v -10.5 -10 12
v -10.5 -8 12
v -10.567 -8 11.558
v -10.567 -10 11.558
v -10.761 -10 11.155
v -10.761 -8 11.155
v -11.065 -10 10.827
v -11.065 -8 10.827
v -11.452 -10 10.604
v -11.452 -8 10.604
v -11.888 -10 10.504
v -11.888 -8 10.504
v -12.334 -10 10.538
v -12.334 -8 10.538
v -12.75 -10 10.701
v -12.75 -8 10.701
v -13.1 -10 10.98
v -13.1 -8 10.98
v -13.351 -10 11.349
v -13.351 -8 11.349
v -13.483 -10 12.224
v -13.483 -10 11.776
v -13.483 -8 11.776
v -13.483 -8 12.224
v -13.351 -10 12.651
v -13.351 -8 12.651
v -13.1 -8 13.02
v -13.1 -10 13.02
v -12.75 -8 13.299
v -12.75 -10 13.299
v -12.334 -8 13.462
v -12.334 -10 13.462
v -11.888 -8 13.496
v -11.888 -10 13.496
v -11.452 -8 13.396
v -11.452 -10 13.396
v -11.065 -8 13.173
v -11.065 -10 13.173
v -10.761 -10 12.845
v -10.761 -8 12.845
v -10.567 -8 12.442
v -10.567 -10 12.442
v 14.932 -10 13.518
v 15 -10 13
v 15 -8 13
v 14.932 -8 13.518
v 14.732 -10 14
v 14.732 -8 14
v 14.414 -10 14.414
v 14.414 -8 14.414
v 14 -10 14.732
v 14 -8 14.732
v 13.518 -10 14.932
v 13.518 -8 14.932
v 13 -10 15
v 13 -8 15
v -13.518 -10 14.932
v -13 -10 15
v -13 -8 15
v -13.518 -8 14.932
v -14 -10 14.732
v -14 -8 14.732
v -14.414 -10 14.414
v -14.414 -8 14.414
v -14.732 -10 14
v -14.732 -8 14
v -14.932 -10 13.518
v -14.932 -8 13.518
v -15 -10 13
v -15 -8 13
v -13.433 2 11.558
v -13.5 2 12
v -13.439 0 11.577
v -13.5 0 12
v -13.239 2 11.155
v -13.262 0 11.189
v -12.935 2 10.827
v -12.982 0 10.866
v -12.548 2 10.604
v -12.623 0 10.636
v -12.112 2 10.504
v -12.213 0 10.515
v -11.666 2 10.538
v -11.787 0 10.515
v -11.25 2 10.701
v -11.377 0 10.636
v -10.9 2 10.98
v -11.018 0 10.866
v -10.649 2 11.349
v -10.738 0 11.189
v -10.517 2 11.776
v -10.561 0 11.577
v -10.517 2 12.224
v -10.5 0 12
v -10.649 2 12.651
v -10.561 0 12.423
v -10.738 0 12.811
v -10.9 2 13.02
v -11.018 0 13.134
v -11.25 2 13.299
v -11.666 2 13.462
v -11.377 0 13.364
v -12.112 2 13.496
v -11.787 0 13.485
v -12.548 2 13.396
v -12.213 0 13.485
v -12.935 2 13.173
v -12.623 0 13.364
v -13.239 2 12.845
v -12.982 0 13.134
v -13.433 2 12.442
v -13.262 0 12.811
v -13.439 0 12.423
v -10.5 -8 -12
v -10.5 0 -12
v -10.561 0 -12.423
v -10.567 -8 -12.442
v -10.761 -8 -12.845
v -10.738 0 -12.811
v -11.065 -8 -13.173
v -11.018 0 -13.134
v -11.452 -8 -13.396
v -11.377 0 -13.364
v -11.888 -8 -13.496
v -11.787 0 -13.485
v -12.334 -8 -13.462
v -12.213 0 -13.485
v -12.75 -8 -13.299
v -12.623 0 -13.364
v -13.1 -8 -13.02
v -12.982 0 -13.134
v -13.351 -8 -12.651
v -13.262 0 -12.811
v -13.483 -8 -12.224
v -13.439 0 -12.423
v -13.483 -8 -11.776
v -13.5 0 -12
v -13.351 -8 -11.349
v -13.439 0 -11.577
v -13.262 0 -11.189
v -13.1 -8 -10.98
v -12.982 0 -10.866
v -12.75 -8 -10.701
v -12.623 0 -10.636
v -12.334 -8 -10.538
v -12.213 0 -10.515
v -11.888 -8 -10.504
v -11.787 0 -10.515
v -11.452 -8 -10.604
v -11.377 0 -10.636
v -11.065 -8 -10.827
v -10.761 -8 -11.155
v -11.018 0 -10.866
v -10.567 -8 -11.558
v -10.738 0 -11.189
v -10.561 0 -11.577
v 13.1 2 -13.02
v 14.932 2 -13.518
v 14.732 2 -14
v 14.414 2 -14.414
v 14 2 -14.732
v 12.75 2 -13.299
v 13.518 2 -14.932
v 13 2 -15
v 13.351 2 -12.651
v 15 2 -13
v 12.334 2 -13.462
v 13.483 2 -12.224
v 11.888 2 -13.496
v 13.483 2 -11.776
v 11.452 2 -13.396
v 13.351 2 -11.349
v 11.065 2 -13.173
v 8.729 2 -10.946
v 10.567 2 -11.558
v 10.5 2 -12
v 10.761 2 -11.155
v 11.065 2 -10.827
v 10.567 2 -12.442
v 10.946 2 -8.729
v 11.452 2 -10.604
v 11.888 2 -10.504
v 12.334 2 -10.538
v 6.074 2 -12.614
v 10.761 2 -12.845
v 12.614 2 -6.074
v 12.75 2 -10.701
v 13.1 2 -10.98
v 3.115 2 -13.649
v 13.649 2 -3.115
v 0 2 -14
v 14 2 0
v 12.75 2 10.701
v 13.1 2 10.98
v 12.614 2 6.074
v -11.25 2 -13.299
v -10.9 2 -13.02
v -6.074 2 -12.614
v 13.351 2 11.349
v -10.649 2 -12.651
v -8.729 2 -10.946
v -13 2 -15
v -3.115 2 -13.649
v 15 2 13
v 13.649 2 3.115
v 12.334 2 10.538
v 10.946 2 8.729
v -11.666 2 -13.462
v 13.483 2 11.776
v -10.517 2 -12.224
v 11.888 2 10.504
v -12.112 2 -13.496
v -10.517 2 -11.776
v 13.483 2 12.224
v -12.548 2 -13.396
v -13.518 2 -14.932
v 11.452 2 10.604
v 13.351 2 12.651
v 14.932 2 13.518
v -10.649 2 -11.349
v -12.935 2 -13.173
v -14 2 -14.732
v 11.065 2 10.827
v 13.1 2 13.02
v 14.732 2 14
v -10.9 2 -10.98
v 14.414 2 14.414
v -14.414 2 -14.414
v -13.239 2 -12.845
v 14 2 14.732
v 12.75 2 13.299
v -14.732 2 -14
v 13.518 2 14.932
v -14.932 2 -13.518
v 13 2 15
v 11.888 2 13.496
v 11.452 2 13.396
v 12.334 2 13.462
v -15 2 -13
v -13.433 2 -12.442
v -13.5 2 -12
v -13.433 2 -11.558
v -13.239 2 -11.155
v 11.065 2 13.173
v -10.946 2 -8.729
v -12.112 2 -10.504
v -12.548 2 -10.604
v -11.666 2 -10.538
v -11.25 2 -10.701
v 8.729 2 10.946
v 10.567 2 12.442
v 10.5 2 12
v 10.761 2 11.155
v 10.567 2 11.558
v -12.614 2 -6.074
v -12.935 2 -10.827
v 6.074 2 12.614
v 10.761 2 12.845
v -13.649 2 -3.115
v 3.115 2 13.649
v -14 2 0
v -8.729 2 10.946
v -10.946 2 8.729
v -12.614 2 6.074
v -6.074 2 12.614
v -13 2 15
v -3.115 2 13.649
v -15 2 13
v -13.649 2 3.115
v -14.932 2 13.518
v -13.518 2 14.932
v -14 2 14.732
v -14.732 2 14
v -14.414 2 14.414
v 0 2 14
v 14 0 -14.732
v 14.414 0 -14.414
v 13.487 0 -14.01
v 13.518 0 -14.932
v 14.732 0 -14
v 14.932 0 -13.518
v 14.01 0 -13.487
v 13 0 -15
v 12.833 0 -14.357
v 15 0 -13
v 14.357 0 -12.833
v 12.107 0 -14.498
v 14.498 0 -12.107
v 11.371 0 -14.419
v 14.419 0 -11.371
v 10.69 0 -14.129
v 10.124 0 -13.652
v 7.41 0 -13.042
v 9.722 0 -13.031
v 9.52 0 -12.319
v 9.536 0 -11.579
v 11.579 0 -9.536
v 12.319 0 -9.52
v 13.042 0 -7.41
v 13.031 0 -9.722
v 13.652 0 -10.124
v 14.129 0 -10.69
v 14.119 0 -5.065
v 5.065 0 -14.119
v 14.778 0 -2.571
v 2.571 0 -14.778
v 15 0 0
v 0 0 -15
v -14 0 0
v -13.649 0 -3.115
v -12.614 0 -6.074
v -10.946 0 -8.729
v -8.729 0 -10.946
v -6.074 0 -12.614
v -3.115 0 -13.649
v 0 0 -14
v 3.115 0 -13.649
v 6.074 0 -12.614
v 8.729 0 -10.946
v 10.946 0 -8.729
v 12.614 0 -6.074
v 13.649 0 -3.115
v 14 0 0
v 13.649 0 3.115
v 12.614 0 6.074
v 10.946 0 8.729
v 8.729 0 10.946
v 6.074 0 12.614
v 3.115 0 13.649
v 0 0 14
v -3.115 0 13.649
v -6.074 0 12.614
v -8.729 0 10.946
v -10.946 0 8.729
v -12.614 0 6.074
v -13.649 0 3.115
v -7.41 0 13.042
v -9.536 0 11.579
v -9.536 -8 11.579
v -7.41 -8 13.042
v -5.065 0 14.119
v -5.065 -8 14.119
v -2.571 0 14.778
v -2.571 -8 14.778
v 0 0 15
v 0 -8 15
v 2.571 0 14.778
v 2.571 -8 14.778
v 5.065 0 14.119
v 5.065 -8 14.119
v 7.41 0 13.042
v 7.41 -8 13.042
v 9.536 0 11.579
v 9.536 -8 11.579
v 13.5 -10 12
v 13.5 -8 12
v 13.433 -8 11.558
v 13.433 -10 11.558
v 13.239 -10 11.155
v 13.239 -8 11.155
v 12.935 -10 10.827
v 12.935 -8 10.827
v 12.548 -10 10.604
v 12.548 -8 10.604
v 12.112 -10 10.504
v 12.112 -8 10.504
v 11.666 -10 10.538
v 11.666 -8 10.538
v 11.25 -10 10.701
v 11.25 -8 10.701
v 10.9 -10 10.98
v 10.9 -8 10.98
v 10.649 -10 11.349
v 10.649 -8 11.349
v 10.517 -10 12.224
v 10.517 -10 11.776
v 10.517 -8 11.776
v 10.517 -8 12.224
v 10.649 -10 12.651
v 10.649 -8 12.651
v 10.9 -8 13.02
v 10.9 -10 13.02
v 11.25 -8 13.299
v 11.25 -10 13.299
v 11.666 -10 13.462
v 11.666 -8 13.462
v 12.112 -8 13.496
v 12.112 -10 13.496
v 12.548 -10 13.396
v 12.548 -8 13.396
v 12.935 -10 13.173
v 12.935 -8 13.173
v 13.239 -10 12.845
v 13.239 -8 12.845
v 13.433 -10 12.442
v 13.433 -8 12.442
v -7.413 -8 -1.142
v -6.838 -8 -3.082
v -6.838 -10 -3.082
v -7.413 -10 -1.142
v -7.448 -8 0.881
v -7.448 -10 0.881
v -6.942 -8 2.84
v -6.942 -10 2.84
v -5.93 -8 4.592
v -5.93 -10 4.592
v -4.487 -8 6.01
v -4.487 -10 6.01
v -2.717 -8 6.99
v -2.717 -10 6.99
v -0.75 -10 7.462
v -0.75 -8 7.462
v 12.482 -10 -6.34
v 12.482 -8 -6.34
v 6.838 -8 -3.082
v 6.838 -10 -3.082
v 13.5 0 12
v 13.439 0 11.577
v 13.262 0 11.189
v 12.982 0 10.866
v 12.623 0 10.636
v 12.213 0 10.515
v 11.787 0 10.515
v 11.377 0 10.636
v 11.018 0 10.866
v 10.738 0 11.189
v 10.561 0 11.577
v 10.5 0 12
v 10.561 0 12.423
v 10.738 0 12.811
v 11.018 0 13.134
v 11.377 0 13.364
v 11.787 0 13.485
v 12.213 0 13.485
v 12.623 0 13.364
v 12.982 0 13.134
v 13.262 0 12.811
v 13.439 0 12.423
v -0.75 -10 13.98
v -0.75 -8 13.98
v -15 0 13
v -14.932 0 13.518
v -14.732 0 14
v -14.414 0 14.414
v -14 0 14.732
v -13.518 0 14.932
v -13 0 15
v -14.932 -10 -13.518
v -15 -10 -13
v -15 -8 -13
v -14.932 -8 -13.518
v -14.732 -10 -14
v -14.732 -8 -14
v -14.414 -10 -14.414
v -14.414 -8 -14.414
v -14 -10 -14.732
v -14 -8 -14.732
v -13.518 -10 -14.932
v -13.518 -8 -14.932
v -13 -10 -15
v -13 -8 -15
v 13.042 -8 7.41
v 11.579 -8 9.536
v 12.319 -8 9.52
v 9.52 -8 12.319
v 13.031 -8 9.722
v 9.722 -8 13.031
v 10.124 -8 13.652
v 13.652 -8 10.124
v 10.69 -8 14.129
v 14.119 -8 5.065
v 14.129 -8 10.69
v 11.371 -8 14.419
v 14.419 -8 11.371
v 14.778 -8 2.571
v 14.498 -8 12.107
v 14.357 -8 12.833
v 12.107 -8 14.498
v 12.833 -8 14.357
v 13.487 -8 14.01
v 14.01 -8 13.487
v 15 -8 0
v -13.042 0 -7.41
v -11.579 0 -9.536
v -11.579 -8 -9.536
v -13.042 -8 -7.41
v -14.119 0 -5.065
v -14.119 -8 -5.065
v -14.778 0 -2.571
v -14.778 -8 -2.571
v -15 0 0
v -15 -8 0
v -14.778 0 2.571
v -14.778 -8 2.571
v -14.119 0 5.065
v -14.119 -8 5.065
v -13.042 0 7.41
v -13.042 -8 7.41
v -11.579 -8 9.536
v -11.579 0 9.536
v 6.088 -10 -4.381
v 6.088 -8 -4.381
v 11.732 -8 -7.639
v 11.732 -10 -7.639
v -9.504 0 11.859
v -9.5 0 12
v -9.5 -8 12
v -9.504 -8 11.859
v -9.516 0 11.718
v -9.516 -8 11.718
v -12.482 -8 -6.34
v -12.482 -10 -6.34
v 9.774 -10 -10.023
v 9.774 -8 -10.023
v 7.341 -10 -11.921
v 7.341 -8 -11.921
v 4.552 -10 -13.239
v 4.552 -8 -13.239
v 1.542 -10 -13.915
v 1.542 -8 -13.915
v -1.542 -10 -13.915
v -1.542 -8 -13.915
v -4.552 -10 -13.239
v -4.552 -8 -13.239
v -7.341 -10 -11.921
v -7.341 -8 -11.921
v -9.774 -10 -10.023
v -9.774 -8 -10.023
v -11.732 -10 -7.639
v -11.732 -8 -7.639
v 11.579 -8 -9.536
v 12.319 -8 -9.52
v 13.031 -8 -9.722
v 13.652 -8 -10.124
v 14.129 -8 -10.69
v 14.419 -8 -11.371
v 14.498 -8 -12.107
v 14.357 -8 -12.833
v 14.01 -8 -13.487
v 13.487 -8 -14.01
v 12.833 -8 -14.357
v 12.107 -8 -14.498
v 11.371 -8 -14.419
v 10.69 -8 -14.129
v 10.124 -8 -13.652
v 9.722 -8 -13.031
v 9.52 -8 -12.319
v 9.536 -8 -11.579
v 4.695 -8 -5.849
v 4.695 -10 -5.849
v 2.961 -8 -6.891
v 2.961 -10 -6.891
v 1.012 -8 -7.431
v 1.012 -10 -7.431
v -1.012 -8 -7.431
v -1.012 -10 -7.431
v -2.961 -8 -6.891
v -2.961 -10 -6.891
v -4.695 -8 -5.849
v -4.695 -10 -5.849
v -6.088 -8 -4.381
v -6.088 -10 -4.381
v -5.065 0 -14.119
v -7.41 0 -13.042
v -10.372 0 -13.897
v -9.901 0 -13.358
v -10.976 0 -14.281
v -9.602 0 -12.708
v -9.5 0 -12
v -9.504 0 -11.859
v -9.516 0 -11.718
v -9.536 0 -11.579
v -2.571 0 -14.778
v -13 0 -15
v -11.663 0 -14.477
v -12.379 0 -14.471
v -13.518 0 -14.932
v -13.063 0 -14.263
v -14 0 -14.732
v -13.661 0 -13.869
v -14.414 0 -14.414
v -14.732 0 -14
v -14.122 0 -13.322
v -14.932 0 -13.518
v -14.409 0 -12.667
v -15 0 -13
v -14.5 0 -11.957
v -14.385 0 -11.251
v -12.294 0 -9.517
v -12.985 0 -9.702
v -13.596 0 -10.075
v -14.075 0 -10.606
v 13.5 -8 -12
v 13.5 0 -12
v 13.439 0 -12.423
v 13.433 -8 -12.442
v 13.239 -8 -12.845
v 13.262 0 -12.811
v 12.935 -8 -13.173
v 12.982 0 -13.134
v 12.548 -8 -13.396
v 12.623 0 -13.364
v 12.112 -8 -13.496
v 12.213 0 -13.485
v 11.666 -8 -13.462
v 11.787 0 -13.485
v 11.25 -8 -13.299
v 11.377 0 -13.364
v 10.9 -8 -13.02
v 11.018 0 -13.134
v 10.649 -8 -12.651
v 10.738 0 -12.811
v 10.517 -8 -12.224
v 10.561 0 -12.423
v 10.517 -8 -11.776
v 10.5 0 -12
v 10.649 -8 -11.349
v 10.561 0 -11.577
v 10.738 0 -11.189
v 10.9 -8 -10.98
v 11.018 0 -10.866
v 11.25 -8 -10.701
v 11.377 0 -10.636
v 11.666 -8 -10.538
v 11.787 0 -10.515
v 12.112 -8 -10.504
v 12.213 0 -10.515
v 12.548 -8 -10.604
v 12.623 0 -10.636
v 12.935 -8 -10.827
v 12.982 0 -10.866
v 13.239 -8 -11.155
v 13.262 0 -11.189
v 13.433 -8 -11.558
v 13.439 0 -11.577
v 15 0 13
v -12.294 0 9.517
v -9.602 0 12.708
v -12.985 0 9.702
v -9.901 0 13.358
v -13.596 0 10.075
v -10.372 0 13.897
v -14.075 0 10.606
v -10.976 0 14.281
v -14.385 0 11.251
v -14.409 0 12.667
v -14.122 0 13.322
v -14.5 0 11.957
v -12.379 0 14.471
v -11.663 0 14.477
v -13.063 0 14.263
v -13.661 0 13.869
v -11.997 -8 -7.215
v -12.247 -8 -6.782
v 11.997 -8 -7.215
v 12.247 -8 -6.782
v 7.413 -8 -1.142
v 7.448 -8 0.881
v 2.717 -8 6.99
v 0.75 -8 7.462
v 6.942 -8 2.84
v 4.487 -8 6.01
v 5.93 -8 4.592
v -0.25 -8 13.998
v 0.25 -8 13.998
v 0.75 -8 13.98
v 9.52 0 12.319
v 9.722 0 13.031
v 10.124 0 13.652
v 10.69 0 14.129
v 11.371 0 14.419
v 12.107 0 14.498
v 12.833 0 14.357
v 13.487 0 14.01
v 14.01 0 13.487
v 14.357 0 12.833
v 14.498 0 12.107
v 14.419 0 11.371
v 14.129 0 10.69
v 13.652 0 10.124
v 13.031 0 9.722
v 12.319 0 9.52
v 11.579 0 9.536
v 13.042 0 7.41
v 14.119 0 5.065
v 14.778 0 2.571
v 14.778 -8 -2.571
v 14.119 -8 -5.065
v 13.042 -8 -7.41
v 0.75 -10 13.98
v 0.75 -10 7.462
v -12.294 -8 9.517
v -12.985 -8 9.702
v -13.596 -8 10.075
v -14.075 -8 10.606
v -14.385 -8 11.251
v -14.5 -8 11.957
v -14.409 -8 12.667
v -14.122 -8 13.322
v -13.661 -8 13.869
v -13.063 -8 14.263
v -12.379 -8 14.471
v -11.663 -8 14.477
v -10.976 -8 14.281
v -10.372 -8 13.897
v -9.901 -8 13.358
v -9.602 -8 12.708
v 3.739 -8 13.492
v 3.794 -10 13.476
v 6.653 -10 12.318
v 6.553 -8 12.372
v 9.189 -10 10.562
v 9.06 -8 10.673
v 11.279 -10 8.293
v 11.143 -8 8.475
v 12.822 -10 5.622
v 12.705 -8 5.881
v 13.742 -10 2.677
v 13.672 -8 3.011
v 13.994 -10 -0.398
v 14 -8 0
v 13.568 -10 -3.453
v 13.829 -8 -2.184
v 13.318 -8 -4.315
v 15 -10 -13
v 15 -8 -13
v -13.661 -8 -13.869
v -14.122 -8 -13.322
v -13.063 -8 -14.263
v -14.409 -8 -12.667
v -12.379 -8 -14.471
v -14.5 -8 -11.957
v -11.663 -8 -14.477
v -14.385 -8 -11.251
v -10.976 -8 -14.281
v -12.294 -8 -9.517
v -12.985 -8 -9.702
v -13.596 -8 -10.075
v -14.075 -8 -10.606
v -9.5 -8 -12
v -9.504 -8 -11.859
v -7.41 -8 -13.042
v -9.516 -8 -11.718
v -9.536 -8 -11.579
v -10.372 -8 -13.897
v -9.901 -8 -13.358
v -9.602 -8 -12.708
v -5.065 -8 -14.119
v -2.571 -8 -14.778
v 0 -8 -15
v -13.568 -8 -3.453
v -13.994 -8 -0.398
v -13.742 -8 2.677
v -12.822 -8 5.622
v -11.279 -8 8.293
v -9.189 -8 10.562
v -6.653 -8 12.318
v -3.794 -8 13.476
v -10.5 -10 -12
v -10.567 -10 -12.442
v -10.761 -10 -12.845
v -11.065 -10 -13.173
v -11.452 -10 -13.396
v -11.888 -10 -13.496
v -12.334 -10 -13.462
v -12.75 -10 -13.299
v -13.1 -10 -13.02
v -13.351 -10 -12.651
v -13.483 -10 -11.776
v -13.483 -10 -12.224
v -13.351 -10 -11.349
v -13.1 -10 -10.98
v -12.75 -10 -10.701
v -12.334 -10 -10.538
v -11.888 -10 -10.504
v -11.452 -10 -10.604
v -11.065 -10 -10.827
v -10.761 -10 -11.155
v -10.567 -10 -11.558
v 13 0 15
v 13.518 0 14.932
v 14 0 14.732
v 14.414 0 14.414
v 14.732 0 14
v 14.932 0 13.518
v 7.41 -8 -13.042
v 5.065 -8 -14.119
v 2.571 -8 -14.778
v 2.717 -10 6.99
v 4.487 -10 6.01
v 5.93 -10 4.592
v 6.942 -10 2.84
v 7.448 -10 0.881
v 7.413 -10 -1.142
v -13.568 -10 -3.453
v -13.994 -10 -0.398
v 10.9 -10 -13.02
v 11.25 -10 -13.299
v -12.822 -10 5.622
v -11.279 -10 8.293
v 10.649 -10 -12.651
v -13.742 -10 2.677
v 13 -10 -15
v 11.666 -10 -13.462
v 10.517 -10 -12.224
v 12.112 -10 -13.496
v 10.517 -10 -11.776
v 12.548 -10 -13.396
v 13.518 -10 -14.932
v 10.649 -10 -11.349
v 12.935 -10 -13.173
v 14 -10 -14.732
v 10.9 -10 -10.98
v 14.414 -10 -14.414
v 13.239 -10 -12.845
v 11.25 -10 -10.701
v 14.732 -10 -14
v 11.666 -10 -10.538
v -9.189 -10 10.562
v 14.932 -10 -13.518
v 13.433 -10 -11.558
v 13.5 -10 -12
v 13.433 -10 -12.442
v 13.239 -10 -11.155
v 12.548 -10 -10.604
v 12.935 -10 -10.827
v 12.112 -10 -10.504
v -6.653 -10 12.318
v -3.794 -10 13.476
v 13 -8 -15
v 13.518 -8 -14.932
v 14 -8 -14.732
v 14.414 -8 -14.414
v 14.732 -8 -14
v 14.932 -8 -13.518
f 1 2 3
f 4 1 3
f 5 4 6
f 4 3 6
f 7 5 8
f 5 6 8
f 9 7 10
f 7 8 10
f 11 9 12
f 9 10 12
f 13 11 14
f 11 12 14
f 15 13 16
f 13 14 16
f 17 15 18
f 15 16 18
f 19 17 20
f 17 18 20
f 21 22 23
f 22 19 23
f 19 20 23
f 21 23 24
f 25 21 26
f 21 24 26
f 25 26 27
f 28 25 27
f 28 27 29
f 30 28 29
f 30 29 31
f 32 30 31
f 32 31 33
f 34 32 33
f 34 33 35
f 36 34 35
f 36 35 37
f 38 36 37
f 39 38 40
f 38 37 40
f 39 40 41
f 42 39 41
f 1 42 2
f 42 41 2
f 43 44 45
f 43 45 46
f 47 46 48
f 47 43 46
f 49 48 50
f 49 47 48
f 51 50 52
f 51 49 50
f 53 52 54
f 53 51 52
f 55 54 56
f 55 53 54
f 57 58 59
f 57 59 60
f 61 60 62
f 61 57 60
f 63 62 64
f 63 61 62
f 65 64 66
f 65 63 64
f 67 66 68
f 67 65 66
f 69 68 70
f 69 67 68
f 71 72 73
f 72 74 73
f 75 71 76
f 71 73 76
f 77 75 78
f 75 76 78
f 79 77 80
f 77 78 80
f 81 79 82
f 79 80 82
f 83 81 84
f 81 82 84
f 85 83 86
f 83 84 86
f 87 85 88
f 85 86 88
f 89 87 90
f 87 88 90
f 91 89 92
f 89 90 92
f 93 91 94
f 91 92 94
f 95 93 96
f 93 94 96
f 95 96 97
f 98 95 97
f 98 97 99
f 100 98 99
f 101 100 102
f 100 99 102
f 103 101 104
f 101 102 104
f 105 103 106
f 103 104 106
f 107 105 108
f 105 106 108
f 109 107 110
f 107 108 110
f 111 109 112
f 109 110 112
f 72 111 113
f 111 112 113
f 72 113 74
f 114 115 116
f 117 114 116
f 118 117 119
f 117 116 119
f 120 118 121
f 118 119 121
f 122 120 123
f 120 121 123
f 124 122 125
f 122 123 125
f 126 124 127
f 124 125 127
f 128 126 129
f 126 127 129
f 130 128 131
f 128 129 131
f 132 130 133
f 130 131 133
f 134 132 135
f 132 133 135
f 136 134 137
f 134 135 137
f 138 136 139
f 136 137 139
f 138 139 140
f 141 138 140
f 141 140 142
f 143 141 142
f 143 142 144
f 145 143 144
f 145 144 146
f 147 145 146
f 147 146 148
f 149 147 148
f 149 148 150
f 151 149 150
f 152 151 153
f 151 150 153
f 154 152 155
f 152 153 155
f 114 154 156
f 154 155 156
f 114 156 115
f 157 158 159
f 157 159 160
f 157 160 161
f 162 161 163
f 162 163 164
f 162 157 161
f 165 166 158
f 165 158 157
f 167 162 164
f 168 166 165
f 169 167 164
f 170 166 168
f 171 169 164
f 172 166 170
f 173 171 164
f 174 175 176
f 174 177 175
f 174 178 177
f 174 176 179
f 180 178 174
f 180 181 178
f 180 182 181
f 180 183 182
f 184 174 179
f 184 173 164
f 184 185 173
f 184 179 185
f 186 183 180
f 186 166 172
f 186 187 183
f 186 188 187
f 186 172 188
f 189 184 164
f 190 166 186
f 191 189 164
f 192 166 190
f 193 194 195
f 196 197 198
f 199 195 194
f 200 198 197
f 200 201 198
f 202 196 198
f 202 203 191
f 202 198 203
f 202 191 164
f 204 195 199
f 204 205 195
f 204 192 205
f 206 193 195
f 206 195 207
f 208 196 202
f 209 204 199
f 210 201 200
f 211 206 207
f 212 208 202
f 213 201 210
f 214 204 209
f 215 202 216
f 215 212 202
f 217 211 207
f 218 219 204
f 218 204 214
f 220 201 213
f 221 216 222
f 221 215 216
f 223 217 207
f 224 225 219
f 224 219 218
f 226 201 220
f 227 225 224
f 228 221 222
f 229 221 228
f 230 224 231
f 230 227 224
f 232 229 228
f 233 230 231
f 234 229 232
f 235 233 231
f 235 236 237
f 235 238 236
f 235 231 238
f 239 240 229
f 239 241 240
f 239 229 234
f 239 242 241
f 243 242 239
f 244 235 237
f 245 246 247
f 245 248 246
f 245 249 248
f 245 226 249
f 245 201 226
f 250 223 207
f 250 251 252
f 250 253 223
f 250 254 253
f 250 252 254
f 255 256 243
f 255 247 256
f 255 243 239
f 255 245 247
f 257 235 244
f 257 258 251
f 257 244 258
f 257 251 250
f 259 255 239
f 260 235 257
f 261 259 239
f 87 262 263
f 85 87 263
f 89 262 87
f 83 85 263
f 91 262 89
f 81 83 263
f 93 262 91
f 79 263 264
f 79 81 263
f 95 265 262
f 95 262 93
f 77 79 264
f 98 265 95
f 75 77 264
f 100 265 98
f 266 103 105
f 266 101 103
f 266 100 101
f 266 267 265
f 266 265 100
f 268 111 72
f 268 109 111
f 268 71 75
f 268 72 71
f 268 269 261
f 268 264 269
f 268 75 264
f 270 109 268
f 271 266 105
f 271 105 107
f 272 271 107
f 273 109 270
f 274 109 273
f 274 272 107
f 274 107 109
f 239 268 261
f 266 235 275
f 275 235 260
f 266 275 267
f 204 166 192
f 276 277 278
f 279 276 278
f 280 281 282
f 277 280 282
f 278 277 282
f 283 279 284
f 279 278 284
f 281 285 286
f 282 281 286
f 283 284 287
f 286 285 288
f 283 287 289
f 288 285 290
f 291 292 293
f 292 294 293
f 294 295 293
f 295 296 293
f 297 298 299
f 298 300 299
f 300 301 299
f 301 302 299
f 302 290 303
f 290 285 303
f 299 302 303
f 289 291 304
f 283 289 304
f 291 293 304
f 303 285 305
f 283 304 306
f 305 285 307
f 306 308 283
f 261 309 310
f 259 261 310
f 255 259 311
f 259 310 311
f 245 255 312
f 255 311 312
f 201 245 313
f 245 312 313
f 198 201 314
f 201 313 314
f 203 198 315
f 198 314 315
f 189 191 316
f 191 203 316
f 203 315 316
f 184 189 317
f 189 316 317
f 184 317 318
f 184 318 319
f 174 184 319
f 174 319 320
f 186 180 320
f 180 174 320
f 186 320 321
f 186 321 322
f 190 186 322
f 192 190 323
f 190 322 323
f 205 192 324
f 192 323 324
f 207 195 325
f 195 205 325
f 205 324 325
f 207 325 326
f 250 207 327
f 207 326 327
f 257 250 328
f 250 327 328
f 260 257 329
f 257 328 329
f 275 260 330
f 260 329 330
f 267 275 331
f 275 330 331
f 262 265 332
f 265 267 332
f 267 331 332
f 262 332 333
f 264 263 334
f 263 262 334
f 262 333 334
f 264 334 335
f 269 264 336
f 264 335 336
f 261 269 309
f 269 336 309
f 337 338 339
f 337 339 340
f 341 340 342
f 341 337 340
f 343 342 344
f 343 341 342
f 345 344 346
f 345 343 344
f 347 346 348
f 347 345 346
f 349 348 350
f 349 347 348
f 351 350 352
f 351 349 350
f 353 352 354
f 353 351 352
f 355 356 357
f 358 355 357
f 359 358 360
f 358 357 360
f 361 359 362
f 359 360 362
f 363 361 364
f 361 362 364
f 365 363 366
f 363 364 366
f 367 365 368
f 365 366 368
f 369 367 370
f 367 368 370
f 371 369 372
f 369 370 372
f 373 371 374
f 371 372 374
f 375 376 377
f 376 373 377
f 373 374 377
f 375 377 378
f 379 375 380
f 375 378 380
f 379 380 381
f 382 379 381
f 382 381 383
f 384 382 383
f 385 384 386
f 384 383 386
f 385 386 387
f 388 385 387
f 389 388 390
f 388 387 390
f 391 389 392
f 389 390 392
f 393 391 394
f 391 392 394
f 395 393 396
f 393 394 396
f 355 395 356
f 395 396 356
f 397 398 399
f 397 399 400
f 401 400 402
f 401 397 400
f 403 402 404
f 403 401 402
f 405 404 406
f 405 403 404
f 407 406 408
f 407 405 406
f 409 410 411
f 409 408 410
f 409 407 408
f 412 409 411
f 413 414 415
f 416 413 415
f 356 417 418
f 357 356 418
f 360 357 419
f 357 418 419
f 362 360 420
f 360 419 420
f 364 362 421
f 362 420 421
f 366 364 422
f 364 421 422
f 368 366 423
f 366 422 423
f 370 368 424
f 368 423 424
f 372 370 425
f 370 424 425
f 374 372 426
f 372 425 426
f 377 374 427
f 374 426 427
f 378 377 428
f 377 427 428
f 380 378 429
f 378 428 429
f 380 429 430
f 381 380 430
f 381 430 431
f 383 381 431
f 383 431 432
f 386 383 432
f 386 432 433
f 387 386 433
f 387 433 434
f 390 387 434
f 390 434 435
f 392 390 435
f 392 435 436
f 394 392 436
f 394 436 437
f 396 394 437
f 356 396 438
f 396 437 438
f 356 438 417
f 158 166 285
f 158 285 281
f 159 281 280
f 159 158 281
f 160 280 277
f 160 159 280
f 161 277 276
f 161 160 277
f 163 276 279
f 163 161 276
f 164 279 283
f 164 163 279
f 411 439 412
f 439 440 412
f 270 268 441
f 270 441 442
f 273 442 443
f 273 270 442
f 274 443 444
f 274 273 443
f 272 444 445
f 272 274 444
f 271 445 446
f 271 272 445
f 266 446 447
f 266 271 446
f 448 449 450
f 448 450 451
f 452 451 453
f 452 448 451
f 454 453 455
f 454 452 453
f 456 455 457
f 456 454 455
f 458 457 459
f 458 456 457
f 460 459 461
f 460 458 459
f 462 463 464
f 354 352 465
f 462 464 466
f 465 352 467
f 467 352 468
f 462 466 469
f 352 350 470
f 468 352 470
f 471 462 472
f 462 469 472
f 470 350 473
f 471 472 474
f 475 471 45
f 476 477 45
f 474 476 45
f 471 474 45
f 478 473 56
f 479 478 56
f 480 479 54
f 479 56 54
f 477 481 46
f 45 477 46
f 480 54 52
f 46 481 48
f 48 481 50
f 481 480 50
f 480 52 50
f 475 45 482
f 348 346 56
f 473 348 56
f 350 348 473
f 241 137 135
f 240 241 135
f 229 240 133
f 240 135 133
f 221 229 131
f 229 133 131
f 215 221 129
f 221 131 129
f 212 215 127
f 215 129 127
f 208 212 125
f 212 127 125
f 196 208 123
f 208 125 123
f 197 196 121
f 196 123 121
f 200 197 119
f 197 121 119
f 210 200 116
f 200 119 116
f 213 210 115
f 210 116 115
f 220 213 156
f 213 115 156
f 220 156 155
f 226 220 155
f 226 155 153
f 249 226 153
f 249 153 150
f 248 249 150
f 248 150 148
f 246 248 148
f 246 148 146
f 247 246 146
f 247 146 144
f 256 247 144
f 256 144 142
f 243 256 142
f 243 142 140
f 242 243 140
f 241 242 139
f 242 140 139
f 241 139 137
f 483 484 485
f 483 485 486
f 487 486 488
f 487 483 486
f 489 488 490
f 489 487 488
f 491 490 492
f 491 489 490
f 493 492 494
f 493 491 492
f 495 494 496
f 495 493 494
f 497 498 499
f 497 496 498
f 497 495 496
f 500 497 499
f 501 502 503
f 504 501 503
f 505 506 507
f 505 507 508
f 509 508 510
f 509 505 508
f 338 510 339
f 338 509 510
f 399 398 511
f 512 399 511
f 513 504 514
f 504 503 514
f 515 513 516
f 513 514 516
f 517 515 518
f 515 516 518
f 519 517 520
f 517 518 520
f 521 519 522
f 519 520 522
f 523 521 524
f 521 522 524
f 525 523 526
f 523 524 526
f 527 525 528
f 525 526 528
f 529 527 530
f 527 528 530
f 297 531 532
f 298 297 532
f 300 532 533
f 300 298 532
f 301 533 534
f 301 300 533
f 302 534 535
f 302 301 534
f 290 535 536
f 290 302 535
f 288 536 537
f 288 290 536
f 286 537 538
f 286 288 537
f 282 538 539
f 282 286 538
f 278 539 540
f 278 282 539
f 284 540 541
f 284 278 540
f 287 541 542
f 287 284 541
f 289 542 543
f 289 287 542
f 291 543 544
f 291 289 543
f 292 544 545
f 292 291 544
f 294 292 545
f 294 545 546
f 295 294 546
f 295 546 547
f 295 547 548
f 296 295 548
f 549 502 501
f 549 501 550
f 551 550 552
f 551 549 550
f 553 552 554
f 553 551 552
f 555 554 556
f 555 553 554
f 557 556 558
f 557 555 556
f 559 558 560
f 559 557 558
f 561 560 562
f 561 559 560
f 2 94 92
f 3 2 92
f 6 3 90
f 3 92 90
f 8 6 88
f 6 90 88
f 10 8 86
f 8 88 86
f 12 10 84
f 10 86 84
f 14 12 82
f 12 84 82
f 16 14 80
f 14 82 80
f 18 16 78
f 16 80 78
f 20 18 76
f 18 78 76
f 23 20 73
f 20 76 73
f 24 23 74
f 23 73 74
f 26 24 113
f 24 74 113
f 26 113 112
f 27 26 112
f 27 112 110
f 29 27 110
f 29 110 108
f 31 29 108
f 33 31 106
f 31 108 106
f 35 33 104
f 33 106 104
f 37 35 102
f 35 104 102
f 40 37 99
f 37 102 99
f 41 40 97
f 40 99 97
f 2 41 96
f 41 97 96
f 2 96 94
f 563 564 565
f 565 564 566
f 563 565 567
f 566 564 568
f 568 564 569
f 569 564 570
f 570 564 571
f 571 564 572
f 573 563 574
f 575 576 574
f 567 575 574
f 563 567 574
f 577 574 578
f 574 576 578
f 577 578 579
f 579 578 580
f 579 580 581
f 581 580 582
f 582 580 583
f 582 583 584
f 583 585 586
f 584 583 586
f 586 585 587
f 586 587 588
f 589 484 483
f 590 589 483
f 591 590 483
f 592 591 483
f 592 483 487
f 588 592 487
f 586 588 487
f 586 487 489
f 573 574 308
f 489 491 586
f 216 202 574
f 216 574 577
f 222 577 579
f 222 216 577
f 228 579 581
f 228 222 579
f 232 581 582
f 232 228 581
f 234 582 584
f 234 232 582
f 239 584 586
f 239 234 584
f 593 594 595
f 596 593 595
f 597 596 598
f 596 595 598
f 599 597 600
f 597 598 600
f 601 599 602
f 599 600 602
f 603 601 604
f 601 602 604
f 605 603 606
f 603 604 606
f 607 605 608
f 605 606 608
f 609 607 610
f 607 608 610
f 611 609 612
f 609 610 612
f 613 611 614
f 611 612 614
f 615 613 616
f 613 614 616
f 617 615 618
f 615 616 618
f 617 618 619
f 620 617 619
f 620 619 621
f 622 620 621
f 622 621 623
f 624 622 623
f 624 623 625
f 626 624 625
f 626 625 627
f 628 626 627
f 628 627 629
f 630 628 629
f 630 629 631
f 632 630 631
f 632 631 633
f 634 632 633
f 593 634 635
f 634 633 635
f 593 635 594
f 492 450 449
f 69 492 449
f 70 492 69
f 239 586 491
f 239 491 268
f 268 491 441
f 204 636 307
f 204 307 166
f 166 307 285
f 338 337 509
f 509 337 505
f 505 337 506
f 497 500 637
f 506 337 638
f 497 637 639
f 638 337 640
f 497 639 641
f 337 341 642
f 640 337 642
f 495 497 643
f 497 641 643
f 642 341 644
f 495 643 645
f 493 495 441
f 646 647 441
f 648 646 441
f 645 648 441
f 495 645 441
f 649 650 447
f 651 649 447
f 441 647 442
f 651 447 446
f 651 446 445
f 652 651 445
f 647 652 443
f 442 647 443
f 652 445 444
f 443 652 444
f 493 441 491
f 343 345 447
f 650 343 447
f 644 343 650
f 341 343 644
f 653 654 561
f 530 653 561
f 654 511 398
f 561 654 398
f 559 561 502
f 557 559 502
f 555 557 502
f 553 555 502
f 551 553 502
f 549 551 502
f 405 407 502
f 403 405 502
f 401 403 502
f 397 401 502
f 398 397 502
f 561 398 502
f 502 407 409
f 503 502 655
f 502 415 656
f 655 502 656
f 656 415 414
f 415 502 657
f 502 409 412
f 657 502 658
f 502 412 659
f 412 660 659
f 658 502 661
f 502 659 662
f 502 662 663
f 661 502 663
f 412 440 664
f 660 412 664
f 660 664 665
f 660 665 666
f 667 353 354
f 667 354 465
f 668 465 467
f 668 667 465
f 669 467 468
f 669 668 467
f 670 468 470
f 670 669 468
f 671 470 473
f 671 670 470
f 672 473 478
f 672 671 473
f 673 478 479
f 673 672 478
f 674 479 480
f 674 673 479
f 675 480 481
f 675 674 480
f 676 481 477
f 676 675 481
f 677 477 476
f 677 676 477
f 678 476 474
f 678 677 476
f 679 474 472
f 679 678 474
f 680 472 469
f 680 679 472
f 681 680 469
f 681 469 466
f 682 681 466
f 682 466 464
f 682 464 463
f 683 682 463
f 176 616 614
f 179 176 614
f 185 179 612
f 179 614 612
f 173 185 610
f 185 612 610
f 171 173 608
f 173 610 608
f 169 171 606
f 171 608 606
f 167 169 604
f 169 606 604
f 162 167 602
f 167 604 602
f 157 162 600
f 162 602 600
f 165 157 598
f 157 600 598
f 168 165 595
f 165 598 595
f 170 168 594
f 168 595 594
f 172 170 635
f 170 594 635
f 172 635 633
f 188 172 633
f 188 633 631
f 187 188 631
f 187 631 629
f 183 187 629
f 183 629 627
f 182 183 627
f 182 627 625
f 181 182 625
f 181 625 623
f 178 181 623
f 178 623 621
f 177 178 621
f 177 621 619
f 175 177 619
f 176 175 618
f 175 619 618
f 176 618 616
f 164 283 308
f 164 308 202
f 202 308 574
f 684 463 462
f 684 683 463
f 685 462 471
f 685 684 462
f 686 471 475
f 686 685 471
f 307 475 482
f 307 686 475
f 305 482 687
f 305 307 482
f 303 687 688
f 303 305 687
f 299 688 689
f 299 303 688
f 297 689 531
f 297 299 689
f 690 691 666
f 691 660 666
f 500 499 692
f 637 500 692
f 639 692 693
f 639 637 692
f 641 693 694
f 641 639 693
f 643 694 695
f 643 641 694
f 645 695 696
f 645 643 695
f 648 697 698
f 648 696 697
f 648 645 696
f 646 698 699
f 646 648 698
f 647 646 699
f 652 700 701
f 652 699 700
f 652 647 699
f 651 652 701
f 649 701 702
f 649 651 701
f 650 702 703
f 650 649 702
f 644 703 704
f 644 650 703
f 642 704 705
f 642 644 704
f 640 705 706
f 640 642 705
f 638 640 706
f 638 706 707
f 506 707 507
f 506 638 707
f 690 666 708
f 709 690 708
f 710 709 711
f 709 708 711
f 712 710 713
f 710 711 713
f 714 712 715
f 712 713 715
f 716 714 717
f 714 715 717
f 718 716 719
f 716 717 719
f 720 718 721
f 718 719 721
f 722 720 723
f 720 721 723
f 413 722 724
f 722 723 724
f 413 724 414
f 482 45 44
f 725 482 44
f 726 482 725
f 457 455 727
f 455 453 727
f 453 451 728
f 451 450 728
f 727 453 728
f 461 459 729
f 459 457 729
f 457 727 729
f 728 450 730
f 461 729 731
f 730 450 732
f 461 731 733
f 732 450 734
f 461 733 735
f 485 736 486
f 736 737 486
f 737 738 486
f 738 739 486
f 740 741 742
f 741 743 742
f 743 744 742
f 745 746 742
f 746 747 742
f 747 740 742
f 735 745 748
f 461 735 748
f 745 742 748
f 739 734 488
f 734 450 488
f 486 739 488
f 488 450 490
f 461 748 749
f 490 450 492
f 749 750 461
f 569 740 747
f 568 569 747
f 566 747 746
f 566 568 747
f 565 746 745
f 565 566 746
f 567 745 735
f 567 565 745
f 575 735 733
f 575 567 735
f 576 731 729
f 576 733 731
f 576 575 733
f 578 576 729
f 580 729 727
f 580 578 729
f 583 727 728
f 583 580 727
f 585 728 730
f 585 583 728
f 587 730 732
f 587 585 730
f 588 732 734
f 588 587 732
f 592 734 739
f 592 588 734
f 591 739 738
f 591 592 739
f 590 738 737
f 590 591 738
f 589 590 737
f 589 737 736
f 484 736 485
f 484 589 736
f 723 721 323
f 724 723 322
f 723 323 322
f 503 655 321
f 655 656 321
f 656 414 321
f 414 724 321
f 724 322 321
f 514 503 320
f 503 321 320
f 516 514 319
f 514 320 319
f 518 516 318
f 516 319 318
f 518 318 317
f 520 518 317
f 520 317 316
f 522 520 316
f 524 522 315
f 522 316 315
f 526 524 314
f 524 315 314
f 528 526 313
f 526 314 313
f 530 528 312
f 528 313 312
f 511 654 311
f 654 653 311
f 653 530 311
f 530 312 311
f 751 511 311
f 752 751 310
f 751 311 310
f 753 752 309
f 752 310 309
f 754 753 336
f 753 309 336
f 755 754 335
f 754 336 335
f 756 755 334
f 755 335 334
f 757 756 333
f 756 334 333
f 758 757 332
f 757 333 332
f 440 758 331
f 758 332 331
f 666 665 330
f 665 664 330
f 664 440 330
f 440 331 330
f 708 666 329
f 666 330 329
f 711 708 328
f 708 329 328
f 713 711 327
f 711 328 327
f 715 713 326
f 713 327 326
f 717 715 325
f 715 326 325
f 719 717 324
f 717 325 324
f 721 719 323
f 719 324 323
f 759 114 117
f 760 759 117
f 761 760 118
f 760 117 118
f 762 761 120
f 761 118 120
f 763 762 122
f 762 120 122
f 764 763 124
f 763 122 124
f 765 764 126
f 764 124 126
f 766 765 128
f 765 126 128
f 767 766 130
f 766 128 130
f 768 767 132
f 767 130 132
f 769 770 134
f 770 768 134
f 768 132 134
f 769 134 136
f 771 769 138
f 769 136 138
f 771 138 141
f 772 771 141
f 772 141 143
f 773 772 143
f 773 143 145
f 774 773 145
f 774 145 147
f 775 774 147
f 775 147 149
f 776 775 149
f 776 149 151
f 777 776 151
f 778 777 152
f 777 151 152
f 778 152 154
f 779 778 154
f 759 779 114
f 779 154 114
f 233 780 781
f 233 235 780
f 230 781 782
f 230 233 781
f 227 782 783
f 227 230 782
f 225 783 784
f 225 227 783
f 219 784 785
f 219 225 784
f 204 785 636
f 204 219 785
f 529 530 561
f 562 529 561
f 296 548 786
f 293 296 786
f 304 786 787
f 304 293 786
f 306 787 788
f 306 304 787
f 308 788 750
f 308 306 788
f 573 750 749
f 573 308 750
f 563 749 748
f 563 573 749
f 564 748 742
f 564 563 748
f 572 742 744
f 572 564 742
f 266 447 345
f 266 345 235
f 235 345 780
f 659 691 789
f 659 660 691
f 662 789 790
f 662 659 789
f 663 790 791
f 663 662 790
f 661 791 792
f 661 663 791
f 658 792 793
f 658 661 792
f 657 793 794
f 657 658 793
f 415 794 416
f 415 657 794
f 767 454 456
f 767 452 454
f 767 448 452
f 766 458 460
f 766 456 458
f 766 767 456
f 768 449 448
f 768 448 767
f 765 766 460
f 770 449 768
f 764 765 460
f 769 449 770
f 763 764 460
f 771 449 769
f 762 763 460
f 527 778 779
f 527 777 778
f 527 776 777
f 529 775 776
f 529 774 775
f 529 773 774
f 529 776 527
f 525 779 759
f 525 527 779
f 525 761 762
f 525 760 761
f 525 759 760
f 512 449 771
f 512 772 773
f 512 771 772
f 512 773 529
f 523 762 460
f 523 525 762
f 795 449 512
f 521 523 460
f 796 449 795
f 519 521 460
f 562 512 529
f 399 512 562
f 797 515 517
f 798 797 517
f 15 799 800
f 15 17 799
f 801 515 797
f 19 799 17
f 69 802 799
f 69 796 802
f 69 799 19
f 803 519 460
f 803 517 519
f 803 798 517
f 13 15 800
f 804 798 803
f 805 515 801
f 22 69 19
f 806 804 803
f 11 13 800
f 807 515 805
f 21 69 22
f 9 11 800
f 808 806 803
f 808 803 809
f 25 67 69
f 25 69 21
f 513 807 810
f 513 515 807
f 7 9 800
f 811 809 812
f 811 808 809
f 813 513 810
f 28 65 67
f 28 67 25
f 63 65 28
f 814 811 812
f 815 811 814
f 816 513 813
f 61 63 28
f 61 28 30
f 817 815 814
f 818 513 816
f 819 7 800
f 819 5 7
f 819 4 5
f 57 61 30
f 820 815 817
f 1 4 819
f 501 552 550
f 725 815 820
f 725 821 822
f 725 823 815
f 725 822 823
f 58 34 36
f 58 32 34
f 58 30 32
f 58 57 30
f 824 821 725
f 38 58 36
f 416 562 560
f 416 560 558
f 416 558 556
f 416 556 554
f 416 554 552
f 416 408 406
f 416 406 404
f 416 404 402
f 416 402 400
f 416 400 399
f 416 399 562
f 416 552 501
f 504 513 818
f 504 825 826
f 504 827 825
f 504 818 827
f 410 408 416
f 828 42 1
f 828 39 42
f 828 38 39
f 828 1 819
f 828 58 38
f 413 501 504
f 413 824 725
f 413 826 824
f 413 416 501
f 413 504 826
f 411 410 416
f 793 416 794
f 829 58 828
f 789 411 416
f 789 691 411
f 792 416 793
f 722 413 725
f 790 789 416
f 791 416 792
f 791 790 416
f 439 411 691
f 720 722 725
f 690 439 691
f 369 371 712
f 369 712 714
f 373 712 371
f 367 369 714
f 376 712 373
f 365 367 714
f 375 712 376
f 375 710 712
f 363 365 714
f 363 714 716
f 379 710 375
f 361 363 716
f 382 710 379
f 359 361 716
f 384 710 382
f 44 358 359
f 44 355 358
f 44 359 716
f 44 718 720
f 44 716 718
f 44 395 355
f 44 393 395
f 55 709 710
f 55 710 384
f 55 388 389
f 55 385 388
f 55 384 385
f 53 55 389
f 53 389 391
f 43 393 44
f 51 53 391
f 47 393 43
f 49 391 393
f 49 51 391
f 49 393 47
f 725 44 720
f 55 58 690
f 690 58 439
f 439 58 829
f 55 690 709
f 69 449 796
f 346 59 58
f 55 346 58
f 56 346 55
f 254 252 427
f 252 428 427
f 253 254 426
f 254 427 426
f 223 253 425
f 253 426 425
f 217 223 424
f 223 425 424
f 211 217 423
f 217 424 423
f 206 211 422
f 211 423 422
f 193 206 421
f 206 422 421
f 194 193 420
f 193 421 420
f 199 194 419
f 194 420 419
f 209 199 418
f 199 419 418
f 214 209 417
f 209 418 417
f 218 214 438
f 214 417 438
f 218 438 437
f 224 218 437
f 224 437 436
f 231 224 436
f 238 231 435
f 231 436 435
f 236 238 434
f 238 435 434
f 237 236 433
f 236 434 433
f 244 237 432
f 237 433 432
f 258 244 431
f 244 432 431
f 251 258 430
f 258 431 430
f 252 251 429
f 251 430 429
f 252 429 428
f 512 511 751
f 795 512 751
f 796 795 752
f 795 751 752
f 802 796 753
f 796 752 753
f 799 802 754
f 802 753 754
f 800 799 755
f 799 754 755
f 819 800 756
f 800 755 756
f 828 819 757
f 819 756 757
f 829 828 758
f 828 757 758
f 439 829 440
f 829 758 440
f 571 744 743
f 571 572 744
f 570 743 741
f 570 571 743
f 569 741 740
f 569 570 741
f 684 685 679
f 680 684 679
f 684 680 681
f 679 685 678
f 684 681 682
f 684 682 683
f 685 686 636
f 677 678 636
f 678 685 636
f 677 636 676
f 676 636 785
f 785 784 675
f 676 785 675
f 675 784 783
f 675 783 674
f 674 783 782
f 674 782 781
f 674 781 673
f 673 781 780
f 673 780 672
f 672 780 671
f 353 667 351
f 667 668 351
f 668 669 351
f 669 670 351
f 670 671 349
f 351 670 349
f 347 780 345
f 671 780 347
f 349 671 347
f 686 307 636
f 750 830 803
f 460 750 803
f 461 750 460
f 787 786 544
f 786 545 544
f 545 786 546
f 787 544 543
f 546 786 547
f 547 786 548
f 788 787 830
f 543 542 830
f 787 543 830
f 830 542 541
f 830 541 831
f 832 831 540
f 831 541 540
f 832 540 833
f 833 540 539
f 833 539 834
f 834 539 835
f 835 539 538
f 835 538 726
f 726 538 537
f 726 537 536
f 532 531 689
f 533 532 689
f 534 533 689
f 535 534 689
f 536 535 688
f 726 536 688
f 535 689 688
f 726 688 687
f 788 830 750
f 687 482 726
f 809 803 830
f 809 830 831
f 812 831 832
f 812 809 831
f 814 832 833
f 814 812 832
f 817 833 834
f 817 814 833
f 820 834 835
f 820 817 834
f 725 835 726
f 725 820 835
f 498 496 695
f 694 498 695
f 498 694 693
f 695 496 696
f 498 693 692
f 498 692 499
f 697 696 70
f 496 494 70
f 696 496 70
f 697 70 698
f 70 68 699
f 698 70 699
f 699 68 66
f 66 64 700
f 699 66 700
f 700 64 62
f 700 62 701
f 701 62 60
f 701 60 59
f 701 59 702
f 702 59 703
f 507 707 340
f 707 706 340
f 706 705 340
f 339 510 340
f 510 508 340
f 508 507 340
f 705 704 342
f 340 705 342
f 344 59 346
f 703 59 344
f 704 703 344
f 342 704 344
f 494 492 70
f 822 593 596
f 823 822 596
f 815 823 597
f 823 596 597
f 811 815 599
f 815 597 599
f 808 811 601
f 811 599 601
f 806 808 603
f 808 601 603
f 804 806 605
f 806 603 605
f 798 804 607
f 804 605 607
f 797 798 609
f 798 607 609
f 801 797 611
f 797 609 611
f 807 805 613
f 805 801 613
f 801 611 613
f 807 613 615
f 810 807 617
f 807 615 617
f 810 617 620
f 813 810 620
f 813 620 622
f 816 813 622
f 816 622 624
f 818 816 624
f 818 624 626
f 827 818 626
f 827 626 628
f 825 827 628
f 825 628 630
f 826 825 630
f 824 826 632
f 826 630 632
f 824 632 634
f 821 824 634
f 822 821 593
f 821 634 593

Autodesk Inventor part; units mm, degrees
ref_plane "YZ Plane" through (0, 0, 0) normal (1, 0, 0) x (0, 1, 0)
ref_plane "XZ Plane" through (0, 0, 0) normal (0, 1, 0) x (-1, 0, 0)
ref_plane "XY Plane" through (0, 0, 0) normal (0, 0, 1) x (1, 0, 0)
sketch "Эскиз1" plane through (0, 0, 0) normal (0, 1, 0) x (-1, 0, 0)
  line L0 (-12, 12) -> (12, 12) construction
  line L1 (12, 12) -> (12, -12) construction
  line L2 (12, -12) -> (-12, -12) construction
  line L3 (-12, -12) -> (-12, 12) construction
  line L4 (-12, 12) -> (12, -12) construction
  line L5 (12, 12) -> (-12, -12) construction
  line L6 (-15, -15) -> (15, -15)
  line L7 (15, -15) -> (15, 15)
  line L8 (15, 15) -> (-15, 15)
  line L9 (-15, 15) -> (-15, -15)
  line L10 (-15, -15) -> (15, 15) construction
  line L11 (15, -15) -> (-15, 15) construction
  circle A0 centre (0, 0) radius 14
  circle A1 centre (-12, -12) radius 1.5
  circle A2 centre (-12, 12) radius 1.5
  circle A3 centre (12, 12) radius 1.5
  circle A4 centre (12, -12) radius 1.5
  dimension "d0" = 24
  dimension "d1" = 24
  dimension "d2" = 30
  dimension "d3" = 30
  dimension "d4" = 28
  dimension "d8" = 3
  dimension "d9" = 3
  dimension "d10" = 3
  dimension "d11" = 3
extrude "Выдавливание1" add sketch "Эскиз1" along normal blind 2
sketch "Эскиз2" plane through (0, 0, 0) normal (0, -1, 0) x (1, 0, 0)
  circle A0 centre (0, 0) radius 14 projected
  circle A1 centre (-12, -12) radius 1.5 projected
  circle A2 centre (-12, 12) radius 1.5 projected
  circle A3 centre (12, 12) radius 1.5 projected
  circle A4 centre (12, -12) radius 1.5 projected
  circle A5 centre (0, 0) radius 15
  circle A6 centre (-12, -12) radius 2.5
  circle A7 centre (-12, 12) radius 2.5
  circle A8 centre (12, 12) radius 2.5
  circle A9 centre (12, -12) radius 2.5
  dimension "d14" = 5
  dimension "d15" = 5
  dimension "d16" = 5
  dimension "d17" = 5
extrude "Выдавливание2" add sketch "Эскиз2" along normal blind 8
sketch "Эскиз4" plane through (0, -8, 0) normal (0, -1, 0) x (1, 0, 0)
  circle A0 centre (12, 12) radius 1.5 projected
  circle A1 centre (-12, -12) radius 1.5 projected
  circle A2 centre (-12, 12) radius 1.5 projected
  circle A3 centre (12, -12) radius 1.5 projected
  circle A4 centre (0, 0) radius 14 projected
  arc A5 (11.5789, -9.5357) -> (11.5789, 9.5357) centre (0, 0) ccw projected
  line L0 (-15, 15) -> (15, 15)
  line L1 (15, 15) -> (15, -15)
  line L2 (15, -15) -> (-15, -15)
  line L3 (-15, -15) -> (-15, 15)
  circle A6 centre (0, 0) radius 7.5
  line L4 (0, 0) -> (0, 15) construction
  line L5 (0, 0) -> (-12.1244, -7) construction
  line L6 (0, 0) -> (12.1244, -7) construction
  line L7 (-0.75, 6.7531) -> (0.75, 6.7531)
  line L8 (0.75, 6.7531) -> (0.75, 14.2469)
  line L9 (0.75, 14.2469) -> (-0.75, 14.2469)
  line L10 (-0.75, 14.2469) -> (-0.75, 6.7531)
  line L11 (-0.75, 6.7531) -> (0.75, 14.2469) construction
  line L12 (0.75, 6.7531) -> (-0.75, 14.2469) construction
  line L13 (-5.565, -4.079) -> (-6.315, -2.7799)
  line L14 (-6.315, -2.7799) -> (-12.8048, -6.5268)
  line L15 (-12.8048, -6.5268) -> (-12.0548, -7.8259)
  line L16 (-12.0548, -7.8259) -> (-5.565, -4.079)
  line L17 (-5.565, -4.079) -> (-12.8048, -6.5268) construction
  line L18 (-6.315, -2.7799) -> (-12.0548, -7.8259) construction
  line L19 (6.315, -2.7799) -> (5.565, -4.079)
  line L20 (5.565, -4.079) -> (12.0548, -7.8259)
  line L21 (12.0548, -7.8259) -> (12.8048, -6.5268)
  line L22 (12.8048, -6.5268) -> (6.315, -2.7799)
  line L23 (6.315, -2.7799) -> (12.0548, -7.8259) construction
  line L24 (5.565, -4.079) -> (12.8048, -6.5268) construction
  point P0 (0, 10.5)
  point P1 (-9.1849, -5.3029)
  point P2 (9.1849, -5.3029)
  dimension "d22" = 15
  dimension "d23" = 120
  dimension "d24" = 120
  dimension "d25" = 1.5
  dimension "d26" = 1.5
  dimension "d27" = 1.5
extrude "Выдавливание4" add sketch "Эскиз4" along normal blind 2 contours L8 A6 L10 A4 | A4 L10 L9 L8 | L22 L21 L20 A4 | A4 L20 A6 L22 | L8 L7 L10 A6 | A6 L22 L19 L20 L16 L13 L14 L10 L7 L8 | A6 L20 L19 L22 | L14 A6 L16 A4 | A4 L16 L15 L14 | L14 L13 L16 A6 | L0 L1 L2 L3
fillet "Сопряжение1" radius 2 8 edges at (-15, -9, -15) (15, -9, -15) (15, 1, -15) (-15, 1, -15) (-15, 1, 15) (-15, -9, 15) (15, 1, 15) (15, -9, 15)
properties part number "Cooler"
